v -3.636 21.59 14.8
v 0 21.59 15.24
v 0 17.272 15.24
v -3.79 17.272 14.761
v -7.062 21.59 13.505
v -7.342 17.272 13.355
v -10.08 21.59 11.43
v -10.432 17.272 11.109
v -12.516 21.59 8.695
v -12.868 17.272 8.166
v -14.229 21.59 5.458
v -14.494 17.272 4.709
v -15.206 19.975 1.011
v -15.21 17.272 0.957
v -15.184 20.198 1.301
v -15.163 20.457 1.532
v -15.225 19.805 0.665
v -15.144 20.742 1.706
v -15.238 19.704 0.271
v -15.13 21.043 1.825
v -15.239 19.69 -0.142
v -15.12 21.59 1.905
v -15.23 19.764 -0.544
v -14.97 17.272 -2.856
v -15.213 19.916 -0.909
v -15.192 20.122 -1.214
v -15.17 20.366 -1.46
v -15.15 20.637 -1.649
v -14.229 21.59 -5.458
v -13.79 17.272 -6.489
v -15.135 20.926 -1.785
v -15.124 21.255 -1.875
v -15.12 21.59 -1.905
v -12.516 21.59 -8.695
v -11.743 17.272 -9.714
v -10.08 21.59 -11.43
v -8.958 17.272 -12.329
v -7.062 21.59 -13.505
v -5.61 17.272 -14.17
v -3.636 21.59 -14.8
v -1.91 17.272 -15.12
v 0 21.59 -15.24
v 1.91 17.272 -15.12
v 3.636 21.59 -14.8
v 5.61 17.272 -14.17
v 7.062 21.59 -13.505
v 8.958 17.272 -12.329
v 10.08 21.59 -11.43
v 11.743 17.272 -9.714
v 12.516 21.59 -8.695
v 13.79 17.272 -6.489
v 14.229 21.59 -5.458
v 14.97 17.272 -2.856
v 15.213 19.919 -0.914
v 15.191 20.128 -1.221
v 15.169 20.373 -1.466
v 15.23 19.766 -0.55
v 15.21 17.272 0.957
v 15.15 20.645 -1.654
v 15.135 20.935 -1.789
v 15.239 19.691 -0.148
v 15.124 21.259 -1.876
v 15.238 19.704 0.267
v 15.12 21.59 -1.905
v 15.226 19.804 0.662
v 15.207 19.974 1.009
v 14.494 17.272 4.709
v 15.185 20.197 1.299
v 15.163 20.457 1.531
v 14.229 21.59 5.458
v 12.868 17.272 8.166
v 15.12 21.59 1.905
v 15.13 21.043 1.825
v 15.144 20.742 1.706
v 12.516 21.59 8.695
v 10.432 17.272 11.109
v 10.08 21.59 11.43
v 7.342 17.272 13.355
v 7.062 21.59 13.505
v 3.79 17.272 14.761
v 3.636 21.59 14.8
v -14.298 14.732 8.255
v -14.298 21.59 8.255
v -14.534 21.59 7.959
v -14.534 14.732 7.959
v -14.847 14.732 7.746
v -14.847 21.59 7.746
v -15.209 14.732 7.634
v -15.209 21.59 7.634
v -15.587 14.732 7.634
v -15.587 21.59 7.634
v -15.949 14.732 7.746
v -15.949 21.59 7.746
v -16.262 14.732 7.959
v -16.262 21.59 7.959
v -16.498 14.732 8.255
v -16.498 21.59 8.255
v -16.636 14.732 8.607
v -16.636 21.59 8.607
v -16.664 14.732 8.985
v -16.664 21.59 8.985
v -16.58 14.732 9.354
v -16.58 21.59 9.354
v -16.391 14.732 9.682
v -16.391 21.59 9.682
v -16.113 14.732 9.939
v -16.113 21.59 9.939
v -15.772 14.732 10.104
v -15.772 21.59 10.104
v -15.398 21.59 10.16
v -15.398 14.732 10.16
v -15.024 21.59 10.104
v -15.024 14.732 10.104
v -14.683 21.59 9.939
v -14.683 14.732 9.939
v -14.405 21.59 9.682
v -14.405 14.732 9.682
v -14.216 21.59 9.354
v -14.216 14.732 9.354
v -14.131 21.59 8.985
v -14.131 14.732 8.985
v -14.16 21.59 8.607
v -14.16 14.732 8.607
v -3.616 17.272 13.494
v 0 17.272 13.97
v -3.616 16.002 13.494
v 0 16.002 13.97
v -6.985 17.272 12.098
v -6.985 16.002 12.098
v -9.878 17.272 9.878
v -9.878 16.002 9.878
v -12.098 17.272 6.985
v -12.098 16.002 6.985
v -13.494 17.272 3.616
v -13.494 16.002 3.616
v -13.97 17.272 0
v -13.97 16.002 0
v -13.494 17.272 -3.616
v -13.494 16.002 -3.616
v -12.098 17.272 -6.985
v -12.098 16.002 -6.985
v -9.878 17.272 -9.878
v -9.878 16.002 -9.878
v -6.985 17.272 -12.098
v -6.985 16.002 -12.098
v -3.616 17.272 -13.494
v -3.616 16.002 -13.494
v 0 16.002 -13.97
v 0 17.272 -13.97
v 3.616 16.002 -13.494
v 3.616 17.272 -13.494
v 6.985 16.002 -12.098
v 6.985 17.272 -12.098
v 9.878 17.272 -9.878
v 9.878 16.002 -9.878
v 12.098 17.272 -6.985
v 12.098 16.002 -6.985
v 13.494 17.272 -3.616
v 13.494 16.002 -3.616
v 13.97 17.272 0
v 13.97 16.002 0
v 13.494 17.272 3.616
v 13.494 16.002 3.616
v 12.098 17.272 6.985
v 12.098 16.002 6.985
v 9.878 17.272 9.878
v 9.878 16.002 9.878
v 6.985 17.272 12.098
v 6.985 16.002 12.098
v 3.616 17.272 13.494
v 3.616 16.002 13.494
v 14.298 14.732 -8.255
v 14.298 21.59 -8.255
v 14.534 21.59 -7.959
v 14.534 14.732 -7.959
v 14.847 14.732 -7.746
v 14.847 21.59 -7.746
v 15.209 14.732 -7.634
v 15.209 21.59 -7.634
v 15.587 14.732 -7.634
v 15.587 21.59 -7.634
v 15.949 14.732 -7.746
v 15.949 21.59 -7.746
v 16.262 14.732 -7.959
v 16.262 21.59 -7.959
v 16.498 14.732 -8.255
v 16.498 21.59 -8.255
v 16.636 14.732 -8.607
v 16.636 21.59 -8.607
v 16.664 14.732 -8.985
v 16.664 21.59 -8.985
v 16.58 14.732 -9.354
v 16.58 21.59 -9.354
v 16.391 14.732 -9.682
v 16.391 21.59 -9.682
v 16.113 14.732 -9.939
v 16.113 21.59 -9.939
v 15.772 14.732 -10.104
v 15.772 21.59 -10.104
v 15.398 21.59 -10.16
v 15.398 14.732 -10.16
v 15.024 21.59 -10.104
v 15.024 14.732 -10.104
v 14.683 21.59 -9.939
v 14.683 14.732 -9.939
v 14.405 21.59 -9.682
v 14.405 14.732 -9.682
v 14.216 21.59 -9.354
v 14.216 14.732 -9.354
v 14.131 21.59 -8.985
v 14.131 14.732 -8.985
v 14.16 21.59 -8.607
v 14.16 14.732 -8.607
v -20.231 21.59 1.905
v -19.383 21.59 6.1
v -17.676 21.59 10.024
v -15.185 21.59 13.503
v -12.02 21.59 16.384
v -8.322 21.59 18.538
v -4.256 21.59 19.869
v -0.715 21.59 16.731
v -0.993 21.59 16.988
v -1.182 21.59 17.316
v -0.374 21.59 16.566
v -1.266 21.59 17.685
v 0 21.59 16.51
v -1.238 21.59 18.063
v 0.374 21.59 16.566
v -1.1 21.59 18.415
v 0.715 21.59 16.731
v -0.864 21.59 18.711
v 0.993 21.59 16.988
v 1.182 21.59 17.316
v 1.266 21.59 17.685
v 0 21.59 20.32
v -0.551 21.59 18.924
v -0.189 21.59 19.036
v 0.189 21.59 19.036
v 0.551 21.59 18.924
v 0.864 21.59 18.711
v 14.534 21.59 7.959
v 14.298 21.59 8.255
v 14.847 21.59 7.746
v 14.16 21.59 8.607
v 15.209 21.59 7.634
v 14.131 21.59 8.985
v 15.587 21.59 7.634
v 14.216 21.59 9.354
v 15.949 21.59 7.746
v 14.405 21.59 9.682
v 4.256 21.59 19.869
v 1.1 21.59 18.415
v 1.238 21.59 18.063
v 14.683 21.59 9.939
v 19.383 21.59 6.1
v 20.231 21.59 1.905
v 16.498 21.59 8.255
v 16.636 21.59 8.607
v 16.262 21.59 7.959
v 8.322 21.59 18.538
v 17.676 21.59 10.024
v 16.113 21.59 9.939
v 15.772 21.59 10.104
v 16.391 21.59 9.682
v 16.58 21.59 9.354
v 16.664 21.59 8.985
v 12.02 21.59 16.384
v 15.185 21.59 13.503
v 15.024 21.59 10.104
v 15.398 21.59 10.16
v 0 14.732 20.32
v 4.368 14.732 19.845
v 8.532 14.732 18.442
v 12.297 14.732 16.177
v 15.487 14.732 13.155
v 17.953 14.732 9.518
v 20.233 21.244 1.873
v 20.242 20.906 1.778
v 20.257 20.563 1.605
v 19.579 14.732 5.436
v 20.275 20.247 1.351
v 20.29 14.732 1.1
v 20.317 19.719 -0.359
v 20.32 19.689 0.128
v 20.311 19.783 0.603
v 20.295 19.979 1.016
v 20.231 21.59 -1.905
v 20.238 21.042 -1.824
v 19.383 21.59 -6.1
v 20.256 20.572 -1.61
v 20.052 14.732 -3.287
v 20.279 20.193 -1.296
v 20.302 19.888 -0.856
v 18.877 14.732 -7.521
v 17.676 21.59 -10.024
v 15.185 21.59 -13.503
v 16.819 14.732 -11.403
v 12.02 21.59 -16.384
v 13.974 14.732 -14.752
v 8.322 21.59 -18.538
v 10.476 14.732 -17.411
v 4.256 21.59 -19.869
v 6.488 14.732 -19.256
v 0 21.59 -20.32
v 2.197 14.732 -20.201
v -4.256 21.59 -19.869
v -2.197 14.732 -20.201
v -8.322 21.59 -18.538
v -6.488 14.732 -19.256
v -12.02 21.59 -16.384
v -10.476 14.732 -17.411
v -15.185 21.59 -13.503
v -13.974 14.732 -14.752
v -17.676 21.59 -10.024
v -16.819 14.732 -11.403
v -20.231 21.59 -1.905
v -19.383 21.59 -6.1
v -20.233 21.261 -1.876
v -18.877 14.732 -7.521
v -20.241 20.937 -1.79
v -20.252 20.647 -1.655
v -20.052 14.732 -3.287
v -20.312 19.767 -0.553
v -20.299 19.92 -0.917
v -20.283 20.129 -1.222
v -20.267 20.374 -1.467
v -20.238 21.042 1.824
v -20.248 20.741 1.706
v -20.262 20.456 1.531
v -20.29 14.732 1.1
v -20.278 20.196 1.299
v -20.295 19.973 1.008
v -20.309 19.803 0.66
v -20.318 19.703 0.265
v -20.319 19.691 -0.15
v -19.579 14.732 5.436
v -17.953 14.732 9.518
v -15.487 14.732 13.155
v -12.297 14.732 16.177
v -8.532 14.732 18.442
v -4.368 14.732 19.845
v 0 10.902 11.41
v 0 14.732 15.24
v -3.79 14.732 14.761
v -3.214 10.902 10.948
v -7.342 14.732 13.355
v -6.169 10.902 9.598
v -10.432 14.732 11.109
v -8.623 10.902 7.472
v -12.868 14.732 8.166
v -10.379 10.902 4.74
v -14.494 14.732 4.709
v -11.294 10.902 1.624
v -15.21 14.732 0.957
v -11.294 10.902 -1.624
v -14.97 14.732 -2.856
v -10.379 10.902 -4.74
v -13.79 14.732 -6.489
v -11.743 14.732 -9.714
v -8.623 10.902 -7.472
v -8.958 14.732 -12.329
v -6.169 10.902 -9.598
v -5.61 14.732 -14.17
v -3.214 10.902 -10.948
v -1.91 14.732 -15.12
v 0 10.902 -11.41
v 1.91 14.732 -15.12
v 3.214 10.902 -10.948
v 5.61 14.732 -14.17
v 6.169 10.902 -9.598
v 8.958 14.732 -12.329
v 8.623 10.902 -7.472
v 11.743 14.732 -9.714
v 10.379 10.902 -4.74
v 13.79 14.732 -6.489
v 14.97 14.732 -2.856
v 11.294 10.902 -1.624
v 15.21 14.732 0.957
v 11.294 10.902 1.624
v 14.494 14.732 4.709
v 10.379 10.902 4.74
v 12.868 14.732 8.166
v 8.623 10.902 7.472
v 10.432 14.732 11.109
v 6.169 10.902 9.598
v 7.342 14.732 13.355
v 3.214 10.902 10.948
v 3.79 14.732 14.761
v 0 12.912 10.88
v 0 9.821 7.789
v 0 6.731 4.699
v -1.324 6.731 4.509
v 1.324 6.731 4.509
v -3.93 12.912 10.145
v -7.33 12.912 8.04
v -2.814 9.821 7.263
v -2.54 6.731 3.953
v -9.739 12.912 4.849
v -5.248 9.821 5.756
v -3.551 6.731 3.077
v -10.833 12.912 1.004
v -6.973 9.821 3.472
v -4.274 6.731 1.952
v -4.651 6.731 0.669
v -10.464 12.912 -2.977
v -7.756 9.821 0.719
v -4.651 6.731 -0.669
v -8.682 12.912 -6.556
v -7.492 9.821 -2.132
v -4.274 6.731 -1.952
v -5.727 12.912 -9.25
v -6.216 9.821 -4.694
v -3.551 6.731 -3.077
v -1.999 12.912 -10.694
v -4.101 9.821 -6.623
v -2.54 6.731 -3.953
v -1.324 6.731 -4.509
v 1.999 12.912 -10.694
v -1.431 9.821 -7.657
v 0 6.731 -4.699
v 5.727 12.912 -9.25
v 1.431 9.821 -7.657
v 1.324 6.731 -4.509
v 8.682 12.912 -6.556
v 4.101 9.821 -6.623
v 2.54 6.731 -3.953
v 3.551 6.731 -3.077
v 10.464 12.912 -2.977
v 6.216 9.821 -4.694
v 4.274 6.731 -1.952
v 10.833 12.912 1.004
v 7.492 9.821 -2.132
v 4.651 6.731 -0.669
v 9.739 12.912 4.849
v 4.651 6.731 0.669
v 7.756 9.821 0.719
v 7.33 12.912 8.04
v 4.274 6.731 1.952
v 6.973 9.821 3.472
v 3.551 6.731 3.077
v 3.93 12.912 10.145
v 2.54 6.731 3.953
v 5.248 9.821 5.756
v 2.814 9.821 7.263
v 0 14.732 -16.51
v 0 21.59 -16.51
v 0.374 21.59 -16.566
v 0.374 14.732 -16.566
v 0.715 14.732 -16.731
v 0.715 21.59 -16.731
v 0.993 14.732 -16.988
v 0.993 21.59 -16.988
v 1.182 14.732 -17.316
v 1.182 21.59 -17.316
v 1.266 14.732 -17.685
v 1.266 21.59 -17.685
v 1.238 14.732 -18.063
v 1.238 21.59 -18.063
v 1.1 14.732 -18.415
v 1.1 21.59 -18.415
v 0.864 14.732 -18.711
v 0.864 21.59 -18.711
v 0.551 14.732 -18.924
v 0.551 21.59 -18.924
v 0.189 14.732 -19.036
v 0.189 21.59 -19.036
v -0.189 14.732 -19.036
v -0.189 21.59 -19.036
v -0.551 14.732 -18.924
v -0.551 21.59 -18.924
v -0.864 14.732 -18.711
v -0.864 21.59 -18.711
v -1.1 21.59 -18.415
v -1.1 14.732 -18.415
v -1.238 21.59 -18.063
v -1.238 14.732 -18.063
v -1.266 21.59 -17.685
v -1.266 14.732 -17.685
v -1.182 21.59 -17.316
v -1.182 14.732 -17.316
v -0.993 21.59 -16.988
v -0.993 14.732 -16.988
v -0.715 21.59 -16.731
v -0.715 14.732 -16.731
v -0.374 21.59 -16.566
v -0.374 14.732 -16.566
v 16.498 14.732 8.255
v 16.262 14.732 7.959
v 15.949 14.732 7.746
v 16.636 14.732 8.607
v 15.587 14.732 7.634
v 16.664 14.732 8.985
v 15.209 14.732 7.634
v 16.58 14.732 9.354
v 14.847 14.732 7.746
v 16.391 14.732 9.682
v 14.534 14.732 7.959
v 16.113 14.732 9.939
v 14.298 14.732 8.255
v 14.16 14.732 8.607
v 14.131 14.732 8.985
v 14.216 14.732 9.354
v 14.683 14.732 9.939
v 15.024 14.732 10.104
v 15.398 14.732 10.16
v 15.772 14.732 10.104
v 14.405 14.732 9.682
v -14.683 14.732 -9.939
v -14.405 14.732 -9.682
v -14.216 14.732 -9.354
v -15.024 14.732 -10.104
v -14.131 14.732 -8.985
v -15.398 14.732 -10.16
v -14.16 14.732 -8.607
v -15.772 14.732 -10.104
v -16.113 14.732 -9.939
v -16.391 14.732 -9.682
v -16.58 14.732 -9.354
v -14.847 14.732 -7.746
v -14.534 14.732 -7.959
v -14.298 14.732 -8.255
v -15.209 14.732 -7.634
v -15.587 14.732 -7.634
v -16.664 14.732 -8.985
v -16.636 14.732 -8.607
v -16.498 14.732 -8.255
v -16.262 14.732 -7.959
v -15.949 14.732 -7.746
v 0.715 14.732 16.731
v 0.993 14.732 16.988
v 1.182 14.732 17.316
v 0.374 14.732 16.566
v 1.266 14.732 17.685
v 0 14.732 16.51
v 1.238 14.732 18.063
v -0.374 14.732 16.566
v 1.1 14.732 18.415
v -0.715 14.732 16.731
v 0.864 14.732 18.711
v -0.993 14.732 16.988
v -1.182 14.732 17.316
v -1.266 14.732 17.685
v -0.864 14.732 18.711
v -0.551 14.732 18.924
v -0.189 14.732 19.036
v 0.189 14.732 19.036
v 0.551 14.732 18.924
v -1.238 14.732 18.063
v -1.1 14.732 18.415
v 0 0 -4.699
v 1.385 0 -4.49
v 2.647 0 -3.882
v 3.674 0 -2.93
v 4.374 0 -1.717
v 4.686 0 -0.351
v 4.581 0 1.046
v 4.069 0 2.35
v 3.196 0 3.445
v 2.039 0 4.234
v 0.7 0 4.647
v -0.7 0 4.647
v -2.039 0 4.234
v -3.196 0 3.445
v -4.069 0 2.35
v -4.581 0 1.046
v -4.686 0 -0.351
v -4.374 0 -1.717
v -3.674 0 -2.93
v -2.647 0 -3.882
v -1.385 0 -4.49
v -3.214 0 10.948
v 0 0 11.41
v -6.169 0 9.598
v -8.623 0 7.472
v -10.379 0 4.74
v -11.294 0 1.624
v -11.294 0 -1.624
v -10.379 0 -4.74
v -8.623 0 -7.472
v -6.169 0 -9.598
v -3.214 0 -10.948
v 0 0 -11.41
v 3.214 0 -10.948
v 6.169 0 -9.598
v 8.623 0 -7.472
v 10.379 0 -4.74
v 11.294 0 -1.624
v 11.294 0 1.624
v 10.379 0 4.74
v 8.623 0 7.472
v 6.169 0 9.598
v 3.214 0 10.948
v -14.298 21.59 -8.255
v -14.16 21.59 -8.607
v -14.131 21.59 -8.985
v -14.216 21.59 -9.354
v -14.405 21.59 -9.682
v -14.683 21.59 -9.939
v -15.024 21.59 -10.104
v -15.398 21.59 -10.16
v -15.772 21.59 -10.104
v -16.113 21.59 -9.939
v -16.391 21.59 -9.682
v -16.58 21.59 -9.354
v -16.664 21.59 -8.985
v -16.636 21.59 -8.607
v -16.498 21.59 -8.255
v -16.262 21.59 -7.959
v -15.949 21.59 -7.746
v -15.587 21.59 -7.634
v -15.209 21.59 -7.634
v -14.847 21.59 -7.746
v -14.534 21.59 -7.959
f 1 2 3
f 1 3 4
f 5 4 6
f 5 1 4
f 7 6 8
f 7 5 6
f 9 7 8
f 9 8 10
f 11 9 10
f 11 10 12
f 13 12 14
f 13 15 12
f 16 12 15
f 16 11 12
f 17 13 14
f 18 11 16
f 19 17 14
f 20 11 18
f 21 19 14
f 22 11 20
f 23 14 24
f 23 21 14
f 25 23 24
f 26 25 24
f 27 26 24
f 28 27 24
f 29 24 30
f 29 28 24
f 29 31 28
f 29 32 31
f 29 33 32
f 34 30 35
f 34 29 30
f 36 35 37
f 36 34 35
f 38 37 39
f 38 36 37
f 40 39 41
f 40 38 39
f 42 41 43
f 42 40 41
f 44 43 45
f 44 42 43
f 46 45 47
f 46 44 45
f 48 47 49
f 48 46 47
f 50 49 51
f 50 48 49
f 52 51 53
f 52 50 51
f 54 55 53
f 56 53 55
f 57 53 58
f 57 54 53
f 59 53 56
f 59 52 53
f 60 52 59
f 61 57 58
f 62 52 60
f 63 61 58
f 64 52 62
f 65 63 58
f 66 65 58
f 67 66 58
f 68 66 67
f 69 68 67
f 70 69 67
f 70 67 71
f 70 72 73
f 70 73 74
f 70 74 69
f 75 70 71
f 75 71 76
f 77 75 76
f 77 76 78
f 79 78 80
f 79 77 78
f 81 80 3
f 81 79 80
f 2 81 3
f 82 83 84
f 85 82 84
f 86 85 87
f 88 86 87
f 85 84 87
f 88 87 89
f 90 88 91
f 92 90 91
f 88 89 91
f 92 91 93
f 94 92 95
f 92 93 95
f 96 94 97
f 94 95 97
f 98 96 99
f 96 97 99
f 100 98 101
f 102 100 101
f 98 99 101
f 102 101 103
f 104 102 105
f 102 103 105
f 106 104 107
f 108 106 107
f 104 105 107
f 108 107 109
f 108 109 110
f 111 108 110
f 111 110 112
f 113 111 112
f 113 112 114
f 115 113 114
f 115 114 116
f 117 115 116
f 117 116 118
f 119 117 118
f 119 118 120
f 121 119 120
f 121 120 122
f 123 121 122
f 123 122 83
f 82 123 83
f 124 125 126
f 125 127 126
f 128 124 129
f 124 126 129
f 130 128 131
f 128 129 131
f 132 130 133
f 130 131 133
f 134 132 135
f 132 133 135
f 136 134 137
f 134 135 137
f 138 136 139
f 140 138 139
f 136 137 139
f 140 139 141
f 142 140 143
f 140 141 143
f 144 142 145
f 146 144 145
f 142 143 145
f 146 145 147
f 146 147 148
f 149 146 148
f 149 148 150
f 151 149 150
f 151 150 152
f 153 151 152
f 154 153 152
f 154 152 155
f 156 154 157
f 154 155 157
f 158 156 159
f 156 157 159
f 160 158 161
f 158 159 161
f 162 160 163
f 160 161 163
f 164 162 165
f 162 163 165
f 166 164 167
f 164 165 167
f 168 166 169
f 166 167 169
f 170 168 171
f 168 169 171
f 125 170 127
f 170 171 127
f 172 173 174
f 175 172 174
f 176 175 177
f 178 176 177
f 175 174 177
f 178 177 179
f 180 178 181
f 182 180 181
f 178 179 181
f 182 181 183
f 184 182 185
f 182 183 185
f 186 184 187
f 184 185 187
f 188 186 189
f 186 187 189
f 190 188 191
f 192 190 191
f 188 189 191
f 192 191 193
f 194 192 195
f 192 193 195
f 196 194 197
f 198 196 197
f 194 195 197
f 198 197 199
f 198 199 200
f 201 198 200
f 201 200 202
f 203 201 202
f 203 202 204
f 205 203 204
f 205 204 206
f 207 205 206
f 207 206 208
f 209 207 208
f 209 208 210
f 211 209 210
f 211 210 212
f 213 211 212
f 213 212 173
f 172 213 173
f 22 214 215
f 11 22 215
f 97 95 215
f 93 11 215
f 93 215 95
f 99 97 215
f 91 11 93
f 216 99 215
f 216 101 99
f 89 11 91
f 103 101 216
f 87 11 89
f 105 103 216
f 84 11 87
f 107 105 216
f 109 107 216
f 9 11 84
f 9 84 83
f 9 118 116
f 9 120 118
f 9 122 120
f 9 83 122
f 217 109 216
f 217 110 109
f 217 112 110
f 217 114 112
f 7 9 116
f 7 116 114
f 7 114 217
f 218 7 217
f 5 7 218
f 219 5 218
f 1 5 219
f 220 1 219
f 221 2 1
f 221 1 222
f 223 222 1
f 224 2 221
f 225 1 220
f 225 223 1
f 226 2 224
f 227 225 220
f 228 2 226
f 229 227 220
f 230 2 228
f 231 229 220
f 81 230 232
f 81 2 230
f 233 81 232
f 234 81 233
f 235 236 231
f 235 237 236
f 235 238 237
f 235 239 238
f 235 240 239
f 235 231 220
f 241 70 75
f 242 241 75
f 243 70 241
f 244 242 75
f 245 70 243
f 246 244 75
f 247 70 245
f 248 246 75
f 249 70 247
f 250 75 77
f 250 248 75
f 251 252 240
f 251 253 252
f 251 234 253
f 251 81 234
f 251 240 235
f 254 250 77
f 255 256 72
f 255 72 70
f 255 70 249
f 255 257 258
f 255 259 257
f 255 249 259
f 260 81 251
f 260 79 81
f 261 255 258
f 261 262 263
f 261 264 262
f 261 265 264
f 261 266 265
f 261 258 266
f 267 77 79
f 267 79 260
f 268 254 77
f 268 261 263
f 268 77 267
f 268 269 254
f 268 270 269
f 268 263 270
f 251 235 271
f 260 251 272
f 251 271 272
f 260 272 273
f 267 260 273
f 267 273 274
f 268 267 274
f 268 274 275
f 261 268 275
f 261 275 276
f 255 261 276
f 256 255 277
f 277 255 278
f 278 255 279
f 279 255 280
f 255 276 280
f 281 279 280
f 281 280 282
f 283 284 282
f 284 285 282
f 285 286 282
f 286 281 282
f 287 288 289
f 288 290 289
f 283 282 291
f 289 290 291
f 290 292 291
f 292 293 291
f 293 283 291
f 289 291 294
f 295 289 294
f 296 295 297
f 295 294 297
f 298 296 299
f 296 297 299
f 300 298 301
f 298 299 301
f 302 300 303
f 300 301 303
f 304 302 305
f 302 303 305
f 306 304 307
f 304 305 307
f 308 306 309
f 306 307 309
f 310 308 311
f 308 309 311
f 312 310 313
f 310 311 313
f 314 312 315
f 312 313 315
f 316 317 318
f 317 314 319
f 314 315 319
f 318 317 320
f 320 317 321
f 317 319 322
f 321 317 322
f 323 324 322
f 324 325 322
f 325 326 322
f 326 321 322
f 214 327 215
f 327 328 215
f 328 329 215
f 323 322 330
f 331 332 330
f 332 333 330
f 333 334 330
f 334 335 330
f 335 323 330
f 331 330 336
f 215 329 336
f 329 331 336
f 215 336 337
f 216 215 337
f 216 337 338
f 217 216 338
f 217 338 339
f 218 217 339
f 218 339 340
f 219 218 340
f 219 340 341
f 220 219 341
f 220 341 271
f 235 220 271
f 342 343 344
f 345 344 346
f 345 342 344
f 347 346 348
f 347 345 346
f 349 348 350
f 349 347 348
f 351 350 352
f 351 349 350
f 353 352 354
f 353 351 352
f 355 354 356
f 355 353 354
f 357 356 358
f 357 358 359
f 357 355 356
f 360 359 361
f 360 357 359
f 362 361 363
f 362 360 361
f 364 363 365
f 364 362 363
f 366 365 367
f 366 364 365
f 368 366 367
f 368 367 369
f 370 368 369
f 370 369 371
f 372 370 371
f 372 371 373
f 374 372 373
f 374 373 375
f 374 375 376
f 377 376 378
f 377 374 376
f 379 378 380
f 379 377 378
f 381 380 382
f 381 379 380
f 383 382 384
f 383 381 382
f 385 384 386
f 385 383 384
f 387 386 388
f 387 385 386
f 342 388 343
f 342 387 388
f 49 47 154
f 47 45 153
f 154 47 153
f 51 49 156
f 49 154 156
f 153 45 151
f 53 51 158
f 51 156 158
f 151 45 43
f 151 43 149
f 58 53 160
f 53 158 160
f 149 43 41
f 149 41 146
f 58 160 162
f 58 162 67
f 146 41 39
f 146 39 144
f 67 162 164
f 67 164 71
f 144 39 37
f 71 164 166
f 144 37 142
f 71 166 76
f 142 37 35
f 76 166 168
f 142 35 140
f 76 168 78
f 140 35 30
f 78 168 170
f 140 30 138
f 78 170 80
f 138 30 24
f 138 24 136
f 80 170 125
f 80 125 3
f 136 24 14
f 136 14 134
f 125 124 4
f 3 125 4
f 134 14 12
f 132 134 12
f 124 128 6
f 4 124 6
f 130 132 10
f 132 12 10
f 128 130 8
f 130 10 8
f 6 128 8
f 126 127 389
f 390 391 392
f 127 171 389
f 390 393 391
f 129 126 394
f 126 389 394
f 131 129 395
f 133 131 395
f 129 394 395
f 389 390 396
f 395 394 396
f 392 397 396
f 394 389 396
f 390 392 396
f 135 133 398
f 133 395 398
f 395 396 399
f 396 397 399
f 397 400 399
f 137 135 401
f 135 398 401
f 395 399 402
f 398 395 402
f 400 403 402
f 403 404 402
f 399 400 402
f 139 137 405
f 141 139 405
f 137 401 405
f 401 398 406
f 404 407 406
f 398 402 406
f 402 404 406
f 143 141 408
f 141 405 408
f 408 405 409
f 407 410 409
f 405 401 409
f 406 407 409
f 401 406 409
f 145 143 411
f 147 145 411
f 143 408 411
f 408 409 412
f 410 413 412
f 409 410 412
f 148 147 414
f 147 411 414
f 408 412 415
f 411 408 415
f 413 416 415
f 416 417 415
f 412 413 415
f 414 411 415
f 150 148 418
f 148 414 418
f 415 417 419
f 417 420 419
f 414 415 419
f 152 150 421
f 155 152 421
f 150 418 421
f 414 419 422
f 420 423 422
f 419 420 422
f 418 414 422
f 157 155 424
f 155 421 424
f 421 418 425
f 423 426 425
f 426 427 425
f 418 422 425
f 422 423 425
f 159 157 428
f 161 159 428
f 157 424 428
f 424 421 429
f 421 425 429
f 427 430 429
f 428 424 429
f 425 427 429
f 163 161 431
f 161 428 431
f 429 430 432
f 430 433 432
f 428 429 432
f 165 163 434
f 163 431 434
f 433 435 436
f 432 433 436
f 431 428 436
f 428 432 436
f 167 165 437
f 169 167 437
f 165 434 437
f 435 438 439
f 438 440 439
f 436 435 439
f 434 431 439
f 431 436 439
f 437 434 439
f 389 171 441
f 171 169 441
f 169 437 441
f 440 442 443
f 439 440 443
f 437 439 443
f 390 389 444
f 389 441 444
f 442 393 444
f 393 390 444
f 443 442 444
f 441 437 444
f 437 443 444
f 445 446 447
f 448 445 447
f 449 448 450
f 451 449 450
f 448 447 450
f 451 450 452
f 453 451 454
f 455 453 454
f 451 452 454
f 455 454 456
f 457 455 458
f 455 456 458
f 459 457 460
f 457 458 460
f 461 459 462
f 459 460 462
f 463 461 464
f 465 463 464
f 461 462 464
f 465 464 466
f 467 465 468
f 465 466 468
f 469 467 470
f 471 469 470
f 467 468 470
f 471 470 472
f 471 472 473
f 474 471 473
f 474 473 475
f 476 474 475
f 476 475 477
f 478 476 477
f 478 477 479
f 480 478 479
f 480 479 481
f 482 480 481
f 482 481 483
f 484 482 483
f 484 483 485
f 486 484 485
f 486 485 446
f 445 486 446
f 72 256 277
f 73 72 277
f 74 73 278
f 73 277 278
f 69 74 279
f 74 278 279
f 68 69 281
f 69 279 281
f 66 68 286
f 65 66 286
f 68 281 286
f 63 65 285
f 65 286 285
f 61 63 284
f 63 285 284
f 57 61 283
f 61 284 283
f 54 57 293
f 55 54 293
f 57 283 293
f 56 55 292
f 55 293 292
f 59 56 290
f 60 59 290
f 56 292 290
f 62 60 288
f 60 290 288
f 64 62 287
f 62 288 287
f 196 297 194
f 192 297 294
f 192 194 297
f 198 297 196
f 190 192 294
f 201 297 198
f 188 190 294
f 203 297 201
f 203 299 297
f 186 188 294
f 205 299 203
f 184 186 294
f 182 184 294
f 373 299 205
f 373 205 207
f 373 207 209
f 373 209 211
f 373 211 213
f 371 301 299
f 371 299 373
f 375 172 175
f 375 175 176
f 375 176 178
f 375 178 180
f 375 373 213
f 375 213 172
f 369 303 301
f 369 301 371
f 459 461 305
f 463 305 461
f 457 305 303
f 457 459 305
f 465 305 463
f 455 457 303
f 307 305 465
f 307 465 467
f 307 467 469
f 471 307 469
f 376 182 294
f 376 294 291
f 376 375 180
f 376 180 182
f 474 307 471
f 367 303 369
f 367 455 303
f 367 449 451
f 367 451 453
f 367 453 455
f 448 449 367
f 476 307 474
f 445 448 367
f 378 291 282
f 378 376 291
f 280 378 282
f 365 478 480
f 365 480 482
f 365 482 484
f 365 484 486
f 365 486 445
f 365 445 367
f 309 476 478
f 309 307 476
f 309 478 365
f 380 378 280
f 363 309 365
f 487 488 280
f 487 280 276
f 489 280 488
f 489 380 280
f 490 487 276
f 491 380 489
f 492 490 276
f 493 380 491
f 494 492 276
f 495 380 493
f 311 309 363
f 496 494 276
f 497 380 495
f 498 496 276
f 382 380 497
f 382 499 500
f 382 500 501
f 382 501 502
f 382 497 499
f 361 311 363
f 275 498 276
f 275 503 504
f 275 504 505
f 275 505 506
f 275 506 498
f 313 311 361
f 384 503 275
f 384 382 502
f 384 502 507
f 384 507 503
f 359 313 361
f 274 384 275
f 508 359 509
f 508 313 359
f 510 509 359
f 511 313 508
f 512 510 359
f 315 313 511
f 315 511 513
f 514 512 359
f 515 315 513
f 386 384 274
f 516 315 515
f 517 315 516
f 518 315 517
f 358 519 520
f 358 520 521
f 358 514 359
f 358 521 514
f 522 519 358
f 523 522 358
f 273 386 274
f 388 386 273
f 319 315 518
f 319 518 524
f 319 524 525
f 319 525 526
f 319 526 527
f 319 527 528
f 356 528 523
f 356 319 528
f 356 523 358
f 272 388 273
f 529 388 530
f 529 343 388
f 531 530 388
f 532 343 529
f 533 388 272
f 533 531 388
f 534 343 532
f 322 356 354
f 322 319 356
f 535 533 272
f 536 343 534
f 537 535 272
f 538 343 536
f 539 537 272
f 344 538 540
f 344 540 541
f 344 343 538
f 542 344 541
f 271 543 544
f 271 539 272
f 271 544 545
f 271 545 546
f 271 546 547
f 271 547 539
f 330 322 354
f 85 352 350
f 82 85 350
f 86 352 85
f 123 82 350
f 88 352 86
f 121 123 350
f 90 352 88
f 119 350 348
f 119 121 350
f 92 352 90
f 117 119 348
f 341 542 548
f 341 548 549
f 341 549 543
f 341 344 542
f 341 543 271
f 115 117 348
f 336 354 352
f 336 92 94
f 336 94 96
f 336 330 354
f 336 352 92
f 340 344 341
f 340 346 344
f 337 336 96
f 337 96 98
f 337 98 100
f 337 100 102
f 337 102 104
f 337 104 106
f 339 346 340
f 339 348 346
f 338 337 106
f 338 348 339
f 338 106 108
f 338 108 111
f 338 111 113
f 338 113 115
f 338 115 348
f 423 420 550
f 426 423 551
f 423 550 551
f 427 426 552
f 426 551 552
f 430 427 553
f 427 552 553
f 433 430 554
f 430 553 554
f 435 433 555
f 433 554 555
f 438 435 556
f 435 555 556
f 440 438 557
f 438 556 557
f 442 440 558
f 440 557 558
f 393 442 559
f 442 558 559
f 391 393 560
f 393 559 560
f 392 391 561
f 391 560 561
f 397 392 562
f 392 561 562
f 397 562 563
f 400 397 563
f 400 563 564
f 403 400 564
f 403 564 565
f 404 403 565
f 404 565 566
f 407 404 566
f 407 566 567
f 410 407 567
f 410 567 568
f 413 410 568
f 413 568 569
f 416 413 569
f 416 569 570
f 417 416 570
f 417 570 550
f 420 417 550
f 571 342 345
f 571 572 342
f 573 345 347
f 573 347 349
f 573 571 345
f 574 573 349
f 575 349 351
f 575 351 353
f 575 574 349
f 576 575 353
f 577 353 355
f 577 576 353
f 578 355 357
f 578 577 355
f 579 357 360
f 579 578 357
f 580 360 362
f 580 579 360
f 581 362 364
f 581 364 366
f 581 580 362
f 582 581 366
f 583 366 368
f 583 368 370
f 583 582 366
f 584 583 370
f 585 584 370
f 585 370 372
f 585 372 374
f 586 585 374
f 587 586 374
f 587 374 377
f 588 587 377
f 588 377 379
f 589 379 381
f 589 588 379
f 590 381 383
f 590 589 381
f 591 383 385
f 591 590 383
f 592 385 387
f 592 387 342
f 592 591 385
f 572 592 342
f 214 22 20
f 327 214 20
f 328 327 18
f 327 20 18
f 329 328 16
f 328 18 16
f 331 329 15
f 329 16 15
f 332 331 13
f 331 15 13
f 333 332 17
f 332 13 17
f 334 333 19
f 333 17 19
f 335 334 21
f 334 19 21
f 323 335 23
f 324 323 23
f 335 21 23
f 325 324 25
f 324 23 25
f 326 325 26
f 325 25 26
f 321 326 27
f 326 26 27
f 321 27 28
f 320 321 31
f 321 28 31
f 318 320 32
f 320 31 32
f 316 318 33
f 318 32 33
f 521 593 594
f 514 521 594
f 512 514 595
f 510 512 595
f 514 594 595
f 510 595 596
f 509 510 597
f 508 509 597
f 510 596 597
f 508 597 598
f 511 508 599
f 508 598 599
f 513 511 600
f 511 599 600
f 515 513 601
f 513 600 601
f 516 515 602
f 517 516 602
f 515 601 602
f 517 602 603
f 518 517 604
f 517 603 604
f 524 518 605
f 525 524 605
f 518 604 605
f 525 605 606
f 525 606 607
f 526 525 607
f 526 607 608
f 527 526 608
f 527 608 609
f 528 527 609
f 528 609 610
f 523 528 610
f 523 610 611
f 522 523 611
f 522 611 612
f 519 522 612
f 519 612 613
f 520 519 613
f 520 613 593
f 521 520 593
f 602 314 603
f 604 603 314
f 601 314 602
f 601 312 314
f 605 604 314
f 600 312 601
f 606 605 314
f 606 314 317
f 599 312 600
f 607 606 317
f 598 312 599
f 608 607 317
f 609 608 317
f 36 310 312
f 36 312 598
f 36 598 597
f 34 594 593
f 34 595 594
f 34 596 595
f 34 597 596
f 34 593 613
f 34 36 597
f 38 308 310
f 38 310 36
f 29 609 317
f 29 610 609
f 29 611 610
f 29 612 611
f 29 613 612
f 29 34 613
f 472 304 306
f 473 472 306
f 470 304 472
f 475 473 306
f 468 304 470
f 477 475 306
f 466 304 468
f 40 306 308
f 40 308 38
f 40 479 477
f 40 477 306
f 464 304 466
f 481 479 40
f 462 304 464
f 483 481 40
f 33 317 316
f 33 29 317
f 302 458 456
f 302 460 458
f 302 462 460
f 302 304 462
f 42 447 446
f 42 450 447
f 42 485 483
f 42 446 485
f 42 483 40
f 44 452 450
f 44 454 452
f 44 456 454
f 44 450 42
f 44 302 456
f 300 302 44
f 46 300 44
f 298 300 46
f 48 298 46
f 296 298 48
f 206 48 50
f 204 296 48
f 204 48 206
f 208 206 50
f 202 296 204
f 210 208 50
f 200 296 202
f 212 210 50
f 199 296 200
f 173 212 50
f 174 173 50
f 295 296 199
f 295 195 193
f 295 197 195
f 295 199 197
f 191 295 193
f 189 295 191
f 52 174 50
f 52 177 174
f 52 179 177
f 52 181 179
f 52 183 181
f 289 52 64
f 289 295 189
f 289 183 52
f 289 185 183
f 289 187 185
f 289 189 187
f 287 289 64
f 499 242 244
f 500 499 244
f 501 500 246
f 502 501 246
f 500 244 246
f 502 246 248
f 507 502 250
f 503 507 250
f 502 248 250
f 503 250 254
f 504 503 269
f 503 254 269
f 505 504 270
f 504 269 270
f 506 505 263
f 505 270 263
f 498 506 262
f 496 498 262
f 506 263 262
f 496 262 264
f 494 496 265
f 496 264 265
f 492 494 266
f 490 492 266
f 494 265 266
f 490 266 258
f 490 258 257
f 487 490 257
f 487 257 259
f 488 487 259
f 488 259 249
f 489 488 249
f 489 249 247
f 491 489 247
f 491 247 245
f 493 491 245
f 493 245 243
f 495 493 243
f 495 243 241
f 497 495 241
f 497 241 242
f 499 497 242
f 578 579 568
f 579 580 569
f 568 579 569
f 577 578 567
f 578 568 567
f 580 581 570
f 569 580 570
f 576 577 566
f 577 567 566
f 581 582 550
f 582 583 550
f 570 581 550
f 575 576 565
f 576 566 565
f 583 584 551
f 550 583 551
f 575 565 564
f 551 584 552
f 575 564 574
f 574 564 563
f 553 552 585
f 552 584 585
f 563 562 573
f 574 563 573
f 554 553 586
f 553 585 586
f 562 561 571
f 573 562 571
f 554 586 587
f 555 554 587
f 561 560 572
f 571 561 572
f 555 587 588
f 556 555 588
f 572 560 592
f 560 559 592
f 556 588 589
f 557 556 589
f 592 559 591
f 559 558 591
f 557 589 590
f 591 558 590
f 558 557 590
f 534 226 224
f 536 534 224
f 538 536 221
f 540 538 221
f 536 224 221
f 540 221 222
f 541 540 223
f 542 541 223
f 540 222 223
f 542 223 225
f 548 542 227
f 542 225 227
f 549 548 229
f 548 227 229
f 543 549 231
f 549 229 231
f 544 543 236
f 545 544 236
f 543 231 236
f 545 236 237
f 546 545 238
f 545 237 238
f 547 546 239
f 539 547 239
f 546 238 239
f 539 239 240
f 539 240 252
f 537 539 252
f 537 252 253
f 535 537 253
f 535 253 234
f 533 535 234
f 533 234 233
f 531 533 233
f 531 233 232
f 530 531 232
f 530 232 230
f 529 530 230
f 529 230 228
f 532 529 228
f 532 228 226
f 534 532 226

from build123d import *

# Parameters (mm, degrees)
SKETCH1_R           = 20.32
BOSS_EXTRUDE1_DEPTH = 21.59
SKETCH2_W           = 15.24
SKETCH2_H           = 4.318
SKETCH3_W           = 5.08
SKETCH3_H           = 14.732
CUT_EXTRUDE1_REACH  = 37.943
SKETCH4_R           = 1.27
CIRPATTERN1_COUNT   = 6
CUT_EXTRUDE2_REACH  = 37.943
SKETCH5_R           = 4.699
SKETCH9_R           = 1.905
CUT_EXTRUDE3_DEPTH  = 51.305467894


with BuildPart() as part:
    # Sketch1 → Boss-Extrude1 (new body)
    with BuildSketch(Plane(origin=(0, 0, 0), x_dir=(1, 0, 0), z_dir=(0, 1, 0))):
        with Locations(Location((0, 0, 0), (0, 0, 270))):
            Circle(SKETCH1_R)
    extrude(amount=BOSS_EXTRUDE1_DEPTH)

    # Sketch2 → Cut-Revolve1 (revolve, cut)
    with BuildSketch(Plane.XY, mode=Mode.PRIVATE) as cut_revolve1_sk:
        with Locations((-7.62, 19.431)):
            Rectangle(SKETCH2_W, SKETCH2_H)
    revolve(cut_revolve1_sk.sketch.rotate(Axis((0, 55, 0), (0, -1, 0)), 270), axis=Axis((0, 55, 0), (0, -1, 0)), mode=Mode.SUBTRACT)

    # Sketch3 → Cut-Revolve2 (revolve, cut)
    with BuildSketch(Plane.XY, mode=Mode.PRIVATE) as cut_revolve2_sk:
        with Locations((-17.78, 7.366)):
            Rectangle(SKETCH3_W, SKETCH3_H)
    revolve(cut_revolve2_sk.sketch.rotate(Axis((0, 55, 0), (0, -1, 0)), 270), axis=Axis((0, 55, 0), (0, -1, 0)), mode=Mode.SUBTRACT)

    # Sketch4 → Cut-Extrude1 (cut, up to next)
    with BuildSketch(Plane(origin=(0, 21.59, 0), x_dir=(1, 0, 0), z_dir=(0, 1, 0)), mode=Mode.PRIVATE) as cut_extrude1_sk1:
        with Locations(Location((0, 17.78, 0), (0, 0, 270))):
            Circle(SKETCH4_R)
    cut_extrude1_tool1 = extrude(cut_extrude1_sk1.sketch, amount=-CUT_EXTRUDE1_REACH, mode=Mode.PRIVATE) & part.part
    cut_extrude1 = cut_extrude1_tool1.solids().sort_by_distance((0, 21.59, -17.78))[0]
    add(cut_extrude1, mode=Mode.SUBTRACT)

    # CirPattern1: Cut-Extrude1 ×6 about axis
    cirpattern1_axis = Axis((0, 0, 0), (0, 1, 0))
    for i in range(1, CIRPATTERN1_COUNT):
        add(cut_extrude1.rotate(cirpattern1_axis, i * 360 / CIRPATTERN1_COUNT), mode=Mode.SUBTRACT)

    # Sketch5 → Cut-Extrude2 (cut, up to next)
    with BuildSketch(Plane.XZ, mode=Mode.PRIVATE) as cut_extrude2_sk1:
        with Locations(Location((0, 0, 0), (0, 0, 270))):
            Circle(SKETCH5_R)
    cut_extrude2_tool1 = extrude(cut_extrude2_sk1.sketch, amount=-CUT_EXTRUDE2_REACH, mode=Mode.PRIVATE) & part.part
    add(cut_extrude2_tool1.solids().sort_by_distance((0, 0, 0))[0], mode=Mode.SUBTRACT)

    # Sketch7 → Cut-Revolve3 (revolve, cut)
    with BuildSketch(Plane.XY, mode=Mode.PRIVATE) as cut_revolve3_sk:
        Polygon((-15.24, 14.732), (-11.40968, 10.90168), (-11.40968, 0), (-15.24, 0), align=None)
    revolve(cut_revolve3_sk.sketch.rotate(Axis((0, 55, 0), (0, -1, 0)), 270), axis=Axis((0, 55, 0), (0, -1, 0)), mode=Mode.SUBTRACT)

    # Sketch8 → Cut-Revolve4 (revolve, cut)
    with BuildSketch(Plane.XY, mode=Mode.PRIVATE) as cut_revolve4_sk:
        Polygon((-4.699, 17.272), (-13.97, 17.272), (-13.97, 16.002), (-4.699, 6.731), align=None)
    revolve(cut_revolve4_sk.sketch.rotate(Axis((0, 55, 0), (0, -1, 0)), 270), axis=Axis((0, 55, 0), (0, -1, 0)), mode=Mode.SUBTRACT)

    # Sketch9 → Cut-Extrude3 (cut, through all)
    with BuildSketch(Plane(origin=(20.32, 0, 0), x_dir=(0, 0, -1), z_dir=(1, 0, 0))):
        with Locations((0, 21.59)):
            Circle(SKETCH9_R)
    extrude(amount=-CUT_EXTRUDE3_DEPTH, mode=Mode.SUBTRACT)


solid = part.part
